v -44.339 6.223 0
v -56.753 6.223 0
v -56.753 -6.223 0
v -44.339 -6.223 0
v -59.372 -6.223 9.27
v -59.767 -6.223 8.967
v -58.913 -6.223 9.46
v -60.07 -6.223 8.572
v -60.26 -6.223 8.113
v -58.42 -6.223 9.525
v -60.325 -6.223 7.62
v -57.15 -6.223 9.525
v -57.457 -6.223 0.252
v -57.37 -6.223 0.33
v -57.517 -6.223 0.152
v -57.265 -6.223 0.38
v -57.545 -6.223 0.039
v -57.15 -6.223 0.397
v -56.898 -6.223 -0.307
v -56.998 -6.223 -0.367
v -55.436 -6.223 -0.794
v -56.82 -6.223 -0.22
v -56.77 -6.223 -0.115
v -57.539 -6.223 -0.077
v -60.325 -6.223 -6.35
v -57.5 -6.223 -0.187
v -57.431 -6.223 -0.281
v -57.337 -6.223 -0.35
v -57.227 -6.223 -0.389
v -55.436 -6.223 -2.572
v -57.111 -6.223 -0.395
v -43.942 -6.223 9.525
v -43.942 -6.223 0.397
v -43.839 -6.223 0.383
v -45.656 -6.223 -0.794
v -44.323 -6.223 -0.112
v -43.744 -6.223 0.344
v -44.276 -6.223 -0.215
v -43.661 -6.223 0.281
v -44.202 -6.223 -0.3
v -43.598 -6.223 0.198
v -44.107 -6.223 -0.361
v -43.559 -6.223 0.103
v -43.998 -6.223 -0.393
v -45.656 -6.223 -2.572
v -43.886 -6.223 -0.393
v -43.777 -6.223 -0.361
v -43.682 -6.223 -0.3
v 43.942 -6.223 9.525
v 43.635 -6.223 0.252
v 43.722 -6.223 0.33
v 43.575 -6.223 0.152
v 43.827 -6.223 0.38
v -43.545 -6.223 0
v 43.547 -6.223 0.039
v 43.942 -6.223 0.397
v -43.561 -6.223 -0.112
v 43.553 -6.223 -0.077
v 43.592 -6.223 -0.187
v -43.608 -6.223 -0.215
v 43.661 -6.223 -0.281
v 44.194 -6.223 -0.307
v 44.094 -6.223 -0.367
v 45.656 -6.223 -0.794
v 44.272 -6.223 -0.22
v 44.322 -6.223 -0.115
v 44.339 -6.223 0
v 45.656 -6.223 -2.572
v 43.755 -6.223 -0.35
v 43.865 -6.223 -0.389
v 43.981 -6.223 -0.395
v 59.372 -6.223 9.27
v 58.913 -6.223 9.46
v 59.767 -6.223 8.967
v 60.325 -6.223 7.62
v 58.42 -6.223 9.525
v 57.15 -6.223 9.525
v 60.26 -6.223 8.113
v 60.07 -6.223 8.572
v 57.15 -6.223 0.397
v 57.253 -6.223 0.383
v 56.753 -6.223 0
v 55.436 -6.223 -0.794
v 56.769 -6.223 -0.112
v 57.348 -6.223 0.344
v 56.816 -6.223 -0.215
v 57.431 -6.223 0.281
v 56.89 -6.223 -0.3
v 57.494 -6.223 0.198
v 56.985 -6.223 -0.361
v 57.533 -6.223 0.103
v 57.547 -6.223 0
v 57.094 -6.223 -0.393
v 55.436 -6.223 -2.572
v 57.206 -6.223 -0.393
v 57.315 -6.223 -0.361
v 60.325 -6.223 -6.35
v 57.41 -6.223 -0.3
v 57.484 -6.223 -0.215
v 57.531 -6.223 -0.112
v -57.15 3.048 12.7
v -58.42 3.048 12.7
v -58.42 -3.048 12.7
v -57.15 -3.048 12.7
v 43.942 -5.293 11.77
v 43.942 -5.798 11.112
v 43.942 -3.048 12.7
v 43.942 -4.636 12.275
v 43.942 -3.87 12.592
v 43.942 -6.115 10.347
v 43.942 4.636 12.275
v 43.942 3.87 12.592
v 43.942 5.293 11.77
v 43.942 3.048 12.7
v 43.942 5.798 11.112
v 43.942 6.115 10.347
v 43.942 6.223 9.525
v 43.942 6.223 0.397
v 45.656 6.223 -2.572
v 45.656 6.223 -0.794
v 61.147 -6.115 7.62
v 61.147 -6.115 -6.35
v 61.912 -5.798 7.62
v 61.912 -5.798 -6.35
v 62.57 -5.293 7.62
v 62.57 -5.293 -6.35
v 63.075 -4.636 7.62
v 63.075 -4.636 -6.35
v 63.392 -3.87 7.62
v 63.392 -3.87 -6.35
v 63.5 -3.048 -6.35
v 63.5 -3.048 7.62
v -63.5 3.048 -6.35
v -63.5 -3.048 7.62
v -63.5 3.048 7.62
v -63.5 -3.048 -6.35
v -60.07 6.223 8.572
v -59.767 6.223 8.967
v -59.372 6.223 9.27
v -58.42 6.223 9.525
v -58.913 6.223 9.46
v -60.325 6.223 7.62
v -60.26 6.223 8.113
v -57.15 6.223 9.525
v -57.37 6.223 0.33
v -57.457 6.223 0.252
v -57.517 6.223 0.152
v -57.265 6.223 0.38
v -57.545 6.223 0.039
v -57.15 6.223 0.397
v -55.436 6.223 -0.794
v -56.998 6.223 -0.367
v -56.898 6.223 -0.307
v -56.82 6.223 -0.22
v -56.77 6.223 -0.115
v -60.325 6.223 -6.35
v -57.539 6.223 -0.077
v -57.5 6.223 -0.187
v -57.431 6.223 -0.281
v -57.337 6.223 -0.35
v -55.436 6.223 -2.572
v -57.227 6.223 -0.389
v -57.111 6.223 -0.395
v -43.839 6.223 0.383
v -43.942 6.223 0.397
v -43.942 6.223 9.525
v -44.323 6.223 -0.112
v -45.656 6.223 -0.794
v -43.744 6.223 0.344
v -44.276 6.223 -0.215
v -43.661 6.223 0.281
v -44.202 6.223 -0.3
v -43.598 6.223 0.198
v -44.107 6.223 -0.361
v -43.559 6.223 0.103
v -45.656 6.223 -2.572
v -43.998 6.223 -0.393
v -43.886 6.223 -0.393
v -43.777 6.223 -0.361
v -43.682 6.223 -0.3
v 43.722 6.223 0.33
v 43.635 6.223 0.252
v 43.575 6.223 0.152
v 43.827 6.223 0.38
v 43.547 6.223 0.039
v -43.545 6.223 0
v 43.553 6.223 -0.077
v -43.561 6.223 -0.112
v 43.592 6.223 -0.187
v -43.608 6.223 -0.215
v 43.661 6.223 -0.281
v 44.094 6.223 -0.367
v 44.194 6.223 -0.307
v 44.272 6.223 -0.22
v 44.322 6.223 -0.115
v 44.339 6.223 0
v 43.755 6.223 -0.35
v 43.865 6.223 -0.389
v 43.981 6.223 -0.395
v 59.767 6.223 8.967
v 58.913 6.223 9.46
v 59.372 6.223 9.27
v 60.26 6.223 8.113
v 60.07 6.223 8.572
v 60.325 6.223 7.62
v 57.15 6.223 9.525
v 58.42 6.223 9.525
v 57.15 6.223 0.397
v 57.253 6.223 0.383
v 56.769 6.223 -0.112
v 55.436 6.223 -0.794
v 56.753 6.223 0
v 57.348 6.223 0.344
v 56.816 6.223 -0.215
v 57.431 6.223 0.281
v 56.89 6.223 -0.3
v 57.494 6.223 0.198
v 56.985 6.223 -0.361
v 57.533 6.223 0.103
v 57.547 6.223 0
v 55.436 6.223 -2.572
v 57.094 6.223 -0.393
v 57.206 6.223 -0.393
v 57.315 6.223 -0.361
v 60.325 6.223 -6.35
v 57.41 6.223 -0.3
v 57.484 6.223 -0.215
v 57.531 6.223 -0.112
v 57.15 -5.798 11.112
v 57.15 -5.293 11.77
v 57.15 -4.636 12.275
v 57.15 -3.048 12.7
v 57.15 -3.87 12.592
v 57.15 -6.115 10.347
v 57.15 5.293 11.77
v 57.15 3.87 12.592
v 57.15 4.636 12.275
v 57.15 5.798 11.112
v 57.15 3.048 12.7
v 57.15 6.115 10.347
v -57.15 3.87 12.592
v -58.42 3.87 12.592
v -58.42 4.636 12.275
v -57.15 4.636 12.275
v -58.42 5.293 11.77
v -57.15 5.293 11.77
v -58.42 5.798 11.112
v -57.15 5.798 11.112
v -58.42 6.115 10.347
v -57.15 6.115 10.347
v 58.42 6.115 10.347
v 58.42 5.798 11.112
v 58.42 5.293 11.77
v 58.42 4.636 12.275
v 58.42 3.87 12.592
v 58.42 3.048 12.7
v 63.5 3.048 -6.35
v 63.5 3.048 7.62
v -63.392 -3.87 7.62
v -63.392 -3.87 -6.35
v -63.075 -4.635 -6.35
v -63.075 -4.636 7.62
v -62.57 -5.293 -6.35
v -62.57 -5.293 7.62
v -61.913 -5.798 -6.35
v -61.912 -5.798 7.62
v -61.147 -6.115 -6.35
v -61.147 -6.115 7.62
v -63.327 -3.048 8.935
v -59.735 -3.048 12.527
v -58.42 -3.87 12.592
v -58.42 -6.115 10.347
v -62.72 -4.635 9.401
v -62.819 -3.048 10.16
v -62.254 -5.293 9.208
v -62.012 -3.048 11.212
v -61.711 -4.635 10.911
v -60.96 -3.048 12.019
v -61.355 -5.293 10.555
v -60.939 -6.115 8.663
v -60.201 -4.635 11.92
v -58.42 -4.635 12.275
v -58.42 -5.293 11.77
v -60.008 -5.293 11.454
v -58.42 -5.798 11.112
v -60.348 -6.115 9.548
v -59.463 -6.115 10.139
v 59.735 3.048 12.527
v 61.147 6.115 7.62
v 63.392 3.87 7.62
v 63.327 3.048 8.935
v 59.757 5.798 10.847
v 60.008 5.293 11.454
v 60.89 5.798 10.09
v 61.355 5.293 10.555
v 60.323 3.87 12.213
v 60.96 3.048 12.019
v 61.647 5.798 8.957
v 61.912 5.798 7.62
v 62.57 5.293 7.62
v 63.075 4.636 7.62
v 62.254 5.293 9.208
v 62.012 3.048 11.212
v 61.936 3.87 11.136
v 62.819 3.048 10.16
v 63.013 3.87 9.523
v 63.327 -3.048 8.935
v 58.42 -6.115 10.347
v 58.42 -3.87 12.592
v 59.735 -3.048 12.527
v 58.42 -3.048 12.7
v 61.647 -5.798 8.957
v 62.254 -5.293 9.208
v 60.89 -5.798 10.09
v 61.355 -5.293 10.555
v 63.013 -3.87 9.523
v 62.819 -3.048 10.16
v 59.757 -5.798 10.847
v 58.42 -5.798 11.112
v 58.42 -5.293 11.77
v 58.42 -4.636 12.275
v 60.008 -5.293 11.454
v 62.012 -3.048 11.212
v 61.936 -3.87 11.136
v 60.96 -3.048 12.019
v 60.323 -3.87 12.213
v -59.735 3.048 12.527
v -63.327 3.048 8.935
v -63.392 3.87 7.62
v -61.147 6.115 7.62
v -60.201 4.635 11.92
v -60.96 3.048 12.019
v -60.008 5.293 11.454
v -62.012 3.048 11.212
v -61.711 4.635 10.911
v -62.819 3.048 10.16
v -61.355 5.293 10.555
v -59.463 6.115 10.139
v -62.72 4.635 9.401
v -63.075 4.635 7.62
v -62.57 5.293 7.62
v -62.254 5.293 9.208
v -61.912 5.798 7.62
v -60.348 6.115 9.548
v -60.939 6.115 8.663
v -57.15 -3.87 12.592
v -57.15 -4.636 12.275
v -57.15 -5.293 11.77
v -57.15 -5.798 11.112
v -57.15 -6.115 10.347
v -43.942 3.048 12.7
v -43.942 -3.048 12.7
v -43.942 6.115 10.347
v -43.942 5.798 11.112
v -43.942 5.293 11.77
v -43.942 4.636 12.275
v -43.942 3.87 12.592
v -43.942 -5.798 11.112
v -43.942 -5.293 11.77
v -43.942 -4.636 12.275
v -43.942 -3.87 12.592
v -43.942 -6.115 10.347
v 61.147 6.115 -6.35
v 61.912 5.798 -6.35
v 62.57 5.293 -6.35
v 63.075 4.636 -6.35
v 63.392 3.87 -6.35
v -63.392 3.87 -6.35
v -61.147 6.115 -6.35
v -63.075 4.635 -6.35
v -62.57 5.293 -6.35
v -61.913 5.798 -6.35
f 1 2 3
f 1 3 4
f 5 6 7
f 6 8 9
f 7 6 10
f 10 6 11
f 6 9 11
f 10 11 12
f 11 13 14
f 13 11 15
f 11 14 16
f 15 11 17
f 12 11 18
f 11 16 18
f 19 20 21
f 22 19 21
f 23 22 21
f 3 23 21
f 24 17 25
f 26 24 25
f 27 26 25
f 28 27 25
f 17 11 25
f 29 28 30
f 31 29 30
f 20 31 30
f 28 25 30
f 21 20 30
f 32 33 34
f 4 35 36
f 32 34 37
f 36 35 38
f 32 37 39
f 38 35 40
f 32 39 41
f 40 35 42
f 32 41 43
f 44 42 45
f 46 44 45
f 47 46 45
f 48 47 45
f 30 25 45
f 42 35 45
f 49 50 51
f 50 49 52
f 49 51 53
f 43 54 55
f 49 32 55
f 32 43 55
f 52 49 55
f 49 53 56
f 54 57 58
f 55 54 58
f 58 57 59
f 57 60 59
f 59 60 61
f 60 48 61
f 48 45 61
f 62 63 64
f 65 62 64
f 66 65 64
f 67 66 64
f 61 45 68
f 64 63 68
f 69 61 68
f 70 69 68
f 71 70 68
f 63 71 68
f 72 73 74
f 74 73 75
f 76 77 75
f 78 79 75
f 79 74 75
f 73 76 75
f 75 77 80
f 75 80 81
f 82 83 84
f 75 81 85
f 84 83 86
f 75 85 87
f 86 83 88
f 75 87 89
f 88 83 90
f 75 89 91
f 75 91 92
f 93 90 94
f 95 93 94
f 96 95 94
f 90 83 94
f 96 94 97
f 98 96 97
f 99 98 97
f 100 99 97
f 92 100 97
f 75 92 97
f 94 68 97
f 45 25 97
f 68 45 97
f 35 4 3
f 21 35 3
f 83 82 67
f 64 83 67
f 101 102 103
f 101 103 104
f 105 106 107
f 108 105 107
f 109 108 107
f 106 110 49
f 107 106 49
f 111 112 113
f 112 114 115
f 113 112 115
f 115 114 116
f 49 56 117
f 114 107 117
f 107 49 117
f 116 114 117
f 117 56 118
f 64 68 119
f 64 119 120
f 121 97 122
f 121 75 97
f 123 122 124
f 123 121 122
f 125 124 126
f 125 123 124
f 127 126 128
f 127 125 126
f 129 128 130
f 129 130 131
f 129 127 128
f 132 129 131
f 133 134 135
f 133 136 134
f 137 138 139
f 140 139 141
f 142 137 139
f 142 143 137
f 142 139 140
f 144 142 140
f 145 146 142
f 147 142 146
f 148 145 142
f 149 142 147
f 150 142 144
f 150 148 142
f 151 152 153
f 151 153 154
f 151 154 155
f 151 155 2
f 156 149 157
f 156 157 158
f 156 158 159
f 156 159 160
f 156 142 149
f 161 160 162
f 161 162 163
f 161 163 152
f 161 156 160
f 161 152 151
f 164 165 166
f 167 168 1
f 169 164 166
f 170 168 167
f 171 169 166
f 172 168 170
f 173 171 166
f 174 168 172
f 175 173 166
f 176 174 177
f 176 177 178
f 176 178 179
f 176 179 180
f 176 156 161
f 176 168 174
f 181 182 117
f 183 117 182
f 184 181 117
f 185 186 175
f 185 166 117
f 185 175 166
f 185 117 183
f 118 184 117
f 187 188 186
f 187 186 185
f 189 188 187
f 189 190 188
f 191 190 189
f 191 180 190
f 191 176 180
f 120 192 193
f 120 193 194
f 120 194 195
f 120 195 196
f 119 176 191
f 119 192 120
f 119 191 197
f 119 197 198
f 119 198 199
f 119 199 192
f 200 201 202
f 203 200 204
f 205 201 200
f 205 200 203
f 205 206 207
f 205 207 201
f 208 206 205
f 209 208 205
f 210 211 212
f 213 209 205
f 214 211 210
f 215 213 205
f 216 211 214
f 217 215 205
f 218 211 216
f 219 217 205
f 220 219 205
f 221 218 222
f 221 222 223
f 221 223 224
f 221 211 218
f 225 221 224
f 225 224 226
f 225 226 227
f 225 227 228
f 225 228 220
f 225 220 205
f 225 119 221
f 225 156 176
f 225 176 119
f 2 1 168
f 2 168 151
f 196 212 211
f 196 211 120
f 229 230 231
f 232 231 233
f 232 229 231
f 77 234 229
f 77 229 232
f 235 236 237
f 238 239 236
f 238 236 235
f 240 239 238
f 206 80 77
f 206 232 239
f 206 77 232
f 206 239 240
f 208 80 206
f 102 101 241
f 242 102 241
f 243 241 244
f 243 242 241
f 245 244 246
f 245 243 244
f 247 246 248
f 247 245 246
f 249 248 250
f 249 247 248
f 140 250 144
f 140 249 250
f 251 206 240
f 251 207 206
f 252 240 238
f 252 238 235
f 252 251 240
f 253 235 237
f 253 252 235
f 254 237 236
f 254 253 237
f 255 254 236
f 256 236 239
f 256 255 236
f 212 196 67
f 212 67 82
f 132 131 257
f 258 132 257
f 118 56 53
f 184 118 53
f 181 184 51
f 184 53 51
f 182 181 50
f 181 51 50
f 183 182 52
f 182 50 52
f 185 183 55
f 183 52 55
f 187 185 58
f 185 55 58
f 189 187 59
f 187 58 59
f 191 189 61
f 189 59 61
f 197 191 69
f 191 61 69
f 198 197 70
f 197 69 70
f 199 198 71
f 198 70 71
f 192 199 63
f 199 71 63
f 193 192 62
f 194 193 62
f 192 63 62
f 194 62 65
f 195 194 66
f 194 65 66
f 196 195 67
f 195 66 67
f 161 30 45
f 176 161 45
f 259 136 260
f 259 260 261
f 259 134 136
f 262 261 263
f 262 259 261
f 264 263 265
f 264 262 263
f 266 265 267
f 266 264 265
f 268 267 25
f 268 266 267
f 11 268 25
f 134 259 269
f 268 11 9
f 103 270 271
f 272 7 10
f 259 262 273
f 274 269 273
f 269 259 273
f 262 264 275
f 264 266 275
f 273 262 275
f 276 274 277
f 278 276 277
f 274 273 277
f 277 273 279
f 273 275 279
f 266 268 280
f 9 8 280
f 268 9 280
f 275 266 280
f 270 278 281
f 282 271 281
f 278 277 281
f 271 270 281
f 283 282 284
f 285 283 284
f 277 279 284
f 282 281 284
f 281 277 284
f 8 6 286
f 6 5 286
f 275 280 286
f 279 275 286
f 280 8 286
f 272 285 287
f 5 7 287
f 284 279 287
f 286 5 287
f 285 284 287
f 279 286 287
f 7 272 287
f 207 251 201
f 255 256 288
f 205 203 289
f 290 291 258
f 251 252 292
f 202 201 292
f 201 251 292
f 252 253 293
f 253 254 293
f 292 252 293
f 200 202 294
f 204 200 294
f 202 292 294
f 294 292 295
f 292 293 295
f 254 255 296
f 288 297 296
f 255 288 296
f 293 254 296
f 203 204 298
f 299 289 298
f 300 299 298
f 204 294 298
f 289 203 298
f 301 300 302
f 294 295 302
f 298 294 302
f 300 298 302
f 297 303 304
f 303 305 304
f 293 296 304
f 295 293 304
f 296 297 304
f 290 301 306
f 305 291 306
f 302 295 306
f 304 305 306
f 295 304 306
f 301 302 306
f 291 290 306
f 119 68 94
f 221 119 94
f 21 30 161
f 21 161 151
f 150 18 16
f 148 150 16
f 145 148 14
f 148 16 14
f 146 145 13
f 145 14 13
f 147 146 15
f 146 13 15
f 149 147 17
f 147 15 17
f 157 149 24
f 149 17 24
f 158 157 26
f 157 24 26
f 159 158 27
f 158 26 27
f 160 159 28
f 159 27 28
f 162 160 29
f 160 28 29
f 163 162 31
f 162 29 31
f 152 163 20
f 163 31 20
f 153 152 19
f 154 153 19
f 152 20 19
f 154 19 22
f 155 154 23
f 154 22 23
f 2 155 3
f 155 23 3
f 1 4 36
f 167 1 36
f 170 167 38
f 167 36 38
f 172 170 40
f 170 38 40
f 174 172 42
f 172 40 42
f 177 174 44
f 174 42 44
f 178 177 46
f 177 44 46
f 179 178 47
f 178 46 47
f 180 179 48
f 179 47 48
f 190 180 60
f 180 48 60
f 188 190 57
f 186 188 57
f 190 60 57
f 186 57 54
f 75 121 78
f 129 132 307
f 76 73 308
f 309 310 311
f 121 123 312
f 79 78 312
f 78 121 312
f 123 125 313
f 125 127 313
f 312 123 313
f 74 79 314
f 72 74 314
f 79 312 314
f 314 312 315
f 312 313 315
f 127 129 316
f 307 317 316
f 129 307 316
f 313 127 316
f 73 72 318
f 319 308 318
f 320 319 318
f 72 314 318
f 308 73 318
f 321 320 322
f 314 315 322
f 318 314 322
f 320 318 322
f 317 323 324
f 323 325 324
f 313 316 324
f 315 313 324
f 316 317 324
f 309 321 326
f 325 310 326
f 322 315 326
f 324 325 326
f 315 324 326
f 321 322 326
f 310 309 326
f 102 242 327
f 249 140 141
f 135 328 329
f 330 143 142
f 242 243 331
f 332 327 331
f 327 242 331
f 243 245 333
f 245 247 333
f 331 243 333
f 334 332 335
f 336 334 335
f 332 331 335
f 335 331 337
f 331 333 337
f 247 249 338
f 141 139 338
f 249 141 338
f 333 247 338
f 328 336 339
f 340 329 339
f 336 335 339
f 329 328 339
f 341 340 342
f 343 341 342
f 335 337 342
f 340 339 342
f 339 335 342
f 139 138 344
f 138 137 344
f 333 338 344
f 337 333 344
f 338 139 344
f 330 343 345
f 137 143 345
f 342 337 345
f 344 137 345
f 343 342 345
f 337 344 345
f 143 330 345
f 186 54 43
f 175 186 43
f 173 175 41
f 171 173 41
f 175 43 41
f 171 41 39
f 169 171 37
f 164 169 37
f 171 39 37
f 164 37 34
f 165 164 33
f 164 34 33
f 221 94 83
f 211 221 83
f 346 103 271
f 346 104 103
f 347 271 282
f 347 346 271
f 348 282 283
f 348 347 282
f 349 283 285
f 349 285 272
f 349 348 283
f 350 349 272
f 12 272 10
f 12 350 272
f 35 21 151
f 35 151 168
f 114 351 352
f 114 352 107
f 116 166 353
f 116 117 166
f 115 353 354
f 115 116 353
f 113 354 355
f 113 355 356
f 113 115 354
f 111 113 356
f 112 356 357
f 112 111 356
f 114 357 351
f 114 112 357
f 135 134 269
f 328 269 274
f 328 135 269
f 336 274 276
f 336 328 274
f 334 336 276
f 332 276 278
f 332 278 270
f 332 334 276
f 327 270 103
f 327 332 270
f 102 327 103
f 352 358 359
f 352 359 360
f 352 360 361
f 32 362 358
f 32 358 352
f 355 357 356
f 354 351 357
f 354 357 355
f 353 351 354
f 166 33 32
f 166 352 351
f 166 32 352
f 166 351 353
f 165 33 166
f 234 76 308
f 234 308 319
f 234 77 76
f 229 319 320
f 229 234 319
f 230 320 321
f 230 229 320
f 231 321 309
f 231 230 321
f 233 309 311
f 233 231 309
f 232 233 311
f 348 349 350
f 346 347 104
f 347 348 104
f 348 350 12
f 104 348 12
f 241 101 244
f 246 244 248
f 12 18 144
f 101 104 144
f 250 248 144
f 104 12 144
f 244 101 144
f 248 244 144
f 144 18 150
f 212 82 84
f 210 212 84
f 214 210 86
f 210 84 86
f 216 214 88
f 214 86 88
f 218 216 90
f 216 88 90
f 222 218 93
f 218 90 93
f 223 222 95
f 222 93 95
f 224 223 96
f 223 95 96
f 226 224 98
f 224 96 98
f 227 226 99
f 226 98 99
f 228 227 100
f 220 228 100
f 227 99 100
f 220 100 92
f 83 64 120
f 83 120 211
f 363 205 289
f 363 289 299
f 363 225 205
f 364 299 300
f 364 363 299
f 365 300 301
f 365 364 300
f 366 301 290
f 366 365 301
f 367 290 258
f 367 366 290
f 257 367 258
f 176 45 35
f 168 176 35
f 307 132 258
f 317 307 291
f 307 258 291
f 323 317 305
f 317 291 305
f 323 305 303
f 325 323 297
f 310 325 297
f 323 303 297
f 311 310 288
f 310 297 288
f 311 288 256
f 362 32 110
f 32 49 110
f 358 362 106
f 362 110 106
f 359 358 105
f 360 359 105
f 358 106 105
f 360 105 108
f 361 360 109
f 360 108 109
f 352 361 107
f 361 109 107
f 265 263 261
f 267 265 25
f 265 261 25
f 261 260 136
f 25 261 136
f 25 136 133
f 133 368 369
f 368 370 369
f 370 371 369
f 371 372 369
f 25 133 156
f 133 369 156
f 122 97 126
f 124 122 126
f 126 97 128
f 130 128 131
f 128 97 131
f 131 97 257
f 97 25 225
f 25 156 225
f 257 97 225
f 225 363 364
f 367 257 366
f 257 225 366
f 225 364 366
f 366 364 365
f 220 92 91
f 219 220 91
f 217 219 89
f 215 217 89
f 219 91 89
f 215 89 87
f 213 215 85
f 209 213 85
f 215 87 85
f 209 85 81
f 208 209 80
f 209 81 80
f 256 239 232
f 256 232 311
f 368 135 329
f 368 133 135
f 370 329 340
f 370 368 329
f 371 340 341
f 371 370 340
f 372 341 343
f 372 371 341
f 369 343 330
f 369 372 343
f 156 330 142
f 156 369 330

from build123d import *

# Parameters (mm, degrees)
F0_W     = 6.35
F0_H     = 12.446
F0_W_2   = 13.208
F0_W_3   = 87.884
F1_DEPTH = 6.35
F2_DEPTH = 12.7
F4_DEPTH = 12.447
F5_R     = 5.08
F6_R     = 3.175
F7_W     = 9.779
F7_H     = 1.778
F8_DEPTH = 12.447


with BuildPart() as f1:
    # F0 (on Top) → F1 (new body)
    with BuildSketch(Plane.XY):
        with Locations((-60.325, 0)):
            Rectangle(F0_W, F0_H)
        with Locations((-50.546, 0)):
            Rectangle(F0_W_2, F0_H)
        Rectangle(F0_W_3, F0_H)
        with Locations((50.546, 0)):
            Rectangle(F0_W_2, F0_H)
        with Locations((60.325, 0)):
            Rectangle(F0_W, F0_H)
    extrude(amount=-F1_DEPTH)

    # F0 (on Top) → F2 (join)
    with BuildSketch(Plane.XY):
        with Locations((-60.325, 0)):
            Rectangle(F0_W, F0_H)
        Rectangle(F0_W_3, F0_H)
        with Locations((60.325, 0)):
            Rectangle(F0_W, F0_H)
    extrude(amount=F2_DEPTH)

    # F3 (on face) → F4 (cut, through all)
    with BuildSketch(Plane.XZ.offset(6.223)):
        with BuildLine():
            ThreePointArc((-57.15, 0.396875), (-57.4306330038, -0.2806330038), (-56.753125, 0))
            Line((-56.753125, 0), (-57.15, 0))
            Line((-57.15, 0), (-57.15, 0.396875))
        make_face()
        with BuildLine():
            Line((-43.942, 0), (-44.338875, 0))
            ThreePointArc((-44.338875, 0), (-43.942, -0.396875), (-43.545125, 0))
            ThreePointArc((-43.545125, 0), (-43.6613669962, 0.2806330038), (-43.942, 0.396875))
            Line((-43.942, 0.396875), (-43.942, 0))
        make_face()
        with BuildLine():
            Line((43.942, 0), (43.942, 0.396875))
            ThreePointArc((43.942, 0.396875), (43.6613669962, -0.2806330038), (44.338875, 0))
            Line((44.338875, 0), (43.942, 0))
        make_face()
        with BuildLine():
            Line((57.15, 0), (56.753125, 0))
            ThreePointArc((56.753125, 0), (57.15, -0.396875), (57.546875, 0))
            ThreePointArc((57.546875, 0), (57.4306330038, 0.2806330038), (57.15, 0.396875))
            Line((57.15, 0.396875), (57.15, 0))
        make_face()
    extrude(amount=-F4_DEPTH, mode=Mode.SUBTRACT)

    # F5
    f5_edges = [f1.edges().sort_by_distance(p)[0] for p in [
        (63.5, 0, 12.7),
        (-63.5, 0, 12.7),
    ]]
    fillet(f5_edges, radius=F5_R)

    # F6
    f6_edges = [f1.edges().sort_by_distance(p)[0] for p in [
        (0, -6.223, 12.7),
        (0, 6.223, 12.7),
        (-63.5, -6.223, 0.635),
        (63.5, -6.223, 0.635),
        (-63.5, 6.223, 0.635),
        (63.5, 6.223, 0.635),
    ]]
    fillet(f6_edges, radius=F6_R)

    # F7 (on face) → F8 (cut, through all)
    with BuildSketch(Plane.XZ.offset(6.223)):
        with Locations((-50.546, -1.68275)):
            Rectangle(F7_W, F7_H)
        with Locations((50.546, -1.68275)):
            Rectangle(F7_W, F7_H)
    extrude(amount=-F8_DEPTH, mode=Mode.SUBTRACT)


solid = f1.part
